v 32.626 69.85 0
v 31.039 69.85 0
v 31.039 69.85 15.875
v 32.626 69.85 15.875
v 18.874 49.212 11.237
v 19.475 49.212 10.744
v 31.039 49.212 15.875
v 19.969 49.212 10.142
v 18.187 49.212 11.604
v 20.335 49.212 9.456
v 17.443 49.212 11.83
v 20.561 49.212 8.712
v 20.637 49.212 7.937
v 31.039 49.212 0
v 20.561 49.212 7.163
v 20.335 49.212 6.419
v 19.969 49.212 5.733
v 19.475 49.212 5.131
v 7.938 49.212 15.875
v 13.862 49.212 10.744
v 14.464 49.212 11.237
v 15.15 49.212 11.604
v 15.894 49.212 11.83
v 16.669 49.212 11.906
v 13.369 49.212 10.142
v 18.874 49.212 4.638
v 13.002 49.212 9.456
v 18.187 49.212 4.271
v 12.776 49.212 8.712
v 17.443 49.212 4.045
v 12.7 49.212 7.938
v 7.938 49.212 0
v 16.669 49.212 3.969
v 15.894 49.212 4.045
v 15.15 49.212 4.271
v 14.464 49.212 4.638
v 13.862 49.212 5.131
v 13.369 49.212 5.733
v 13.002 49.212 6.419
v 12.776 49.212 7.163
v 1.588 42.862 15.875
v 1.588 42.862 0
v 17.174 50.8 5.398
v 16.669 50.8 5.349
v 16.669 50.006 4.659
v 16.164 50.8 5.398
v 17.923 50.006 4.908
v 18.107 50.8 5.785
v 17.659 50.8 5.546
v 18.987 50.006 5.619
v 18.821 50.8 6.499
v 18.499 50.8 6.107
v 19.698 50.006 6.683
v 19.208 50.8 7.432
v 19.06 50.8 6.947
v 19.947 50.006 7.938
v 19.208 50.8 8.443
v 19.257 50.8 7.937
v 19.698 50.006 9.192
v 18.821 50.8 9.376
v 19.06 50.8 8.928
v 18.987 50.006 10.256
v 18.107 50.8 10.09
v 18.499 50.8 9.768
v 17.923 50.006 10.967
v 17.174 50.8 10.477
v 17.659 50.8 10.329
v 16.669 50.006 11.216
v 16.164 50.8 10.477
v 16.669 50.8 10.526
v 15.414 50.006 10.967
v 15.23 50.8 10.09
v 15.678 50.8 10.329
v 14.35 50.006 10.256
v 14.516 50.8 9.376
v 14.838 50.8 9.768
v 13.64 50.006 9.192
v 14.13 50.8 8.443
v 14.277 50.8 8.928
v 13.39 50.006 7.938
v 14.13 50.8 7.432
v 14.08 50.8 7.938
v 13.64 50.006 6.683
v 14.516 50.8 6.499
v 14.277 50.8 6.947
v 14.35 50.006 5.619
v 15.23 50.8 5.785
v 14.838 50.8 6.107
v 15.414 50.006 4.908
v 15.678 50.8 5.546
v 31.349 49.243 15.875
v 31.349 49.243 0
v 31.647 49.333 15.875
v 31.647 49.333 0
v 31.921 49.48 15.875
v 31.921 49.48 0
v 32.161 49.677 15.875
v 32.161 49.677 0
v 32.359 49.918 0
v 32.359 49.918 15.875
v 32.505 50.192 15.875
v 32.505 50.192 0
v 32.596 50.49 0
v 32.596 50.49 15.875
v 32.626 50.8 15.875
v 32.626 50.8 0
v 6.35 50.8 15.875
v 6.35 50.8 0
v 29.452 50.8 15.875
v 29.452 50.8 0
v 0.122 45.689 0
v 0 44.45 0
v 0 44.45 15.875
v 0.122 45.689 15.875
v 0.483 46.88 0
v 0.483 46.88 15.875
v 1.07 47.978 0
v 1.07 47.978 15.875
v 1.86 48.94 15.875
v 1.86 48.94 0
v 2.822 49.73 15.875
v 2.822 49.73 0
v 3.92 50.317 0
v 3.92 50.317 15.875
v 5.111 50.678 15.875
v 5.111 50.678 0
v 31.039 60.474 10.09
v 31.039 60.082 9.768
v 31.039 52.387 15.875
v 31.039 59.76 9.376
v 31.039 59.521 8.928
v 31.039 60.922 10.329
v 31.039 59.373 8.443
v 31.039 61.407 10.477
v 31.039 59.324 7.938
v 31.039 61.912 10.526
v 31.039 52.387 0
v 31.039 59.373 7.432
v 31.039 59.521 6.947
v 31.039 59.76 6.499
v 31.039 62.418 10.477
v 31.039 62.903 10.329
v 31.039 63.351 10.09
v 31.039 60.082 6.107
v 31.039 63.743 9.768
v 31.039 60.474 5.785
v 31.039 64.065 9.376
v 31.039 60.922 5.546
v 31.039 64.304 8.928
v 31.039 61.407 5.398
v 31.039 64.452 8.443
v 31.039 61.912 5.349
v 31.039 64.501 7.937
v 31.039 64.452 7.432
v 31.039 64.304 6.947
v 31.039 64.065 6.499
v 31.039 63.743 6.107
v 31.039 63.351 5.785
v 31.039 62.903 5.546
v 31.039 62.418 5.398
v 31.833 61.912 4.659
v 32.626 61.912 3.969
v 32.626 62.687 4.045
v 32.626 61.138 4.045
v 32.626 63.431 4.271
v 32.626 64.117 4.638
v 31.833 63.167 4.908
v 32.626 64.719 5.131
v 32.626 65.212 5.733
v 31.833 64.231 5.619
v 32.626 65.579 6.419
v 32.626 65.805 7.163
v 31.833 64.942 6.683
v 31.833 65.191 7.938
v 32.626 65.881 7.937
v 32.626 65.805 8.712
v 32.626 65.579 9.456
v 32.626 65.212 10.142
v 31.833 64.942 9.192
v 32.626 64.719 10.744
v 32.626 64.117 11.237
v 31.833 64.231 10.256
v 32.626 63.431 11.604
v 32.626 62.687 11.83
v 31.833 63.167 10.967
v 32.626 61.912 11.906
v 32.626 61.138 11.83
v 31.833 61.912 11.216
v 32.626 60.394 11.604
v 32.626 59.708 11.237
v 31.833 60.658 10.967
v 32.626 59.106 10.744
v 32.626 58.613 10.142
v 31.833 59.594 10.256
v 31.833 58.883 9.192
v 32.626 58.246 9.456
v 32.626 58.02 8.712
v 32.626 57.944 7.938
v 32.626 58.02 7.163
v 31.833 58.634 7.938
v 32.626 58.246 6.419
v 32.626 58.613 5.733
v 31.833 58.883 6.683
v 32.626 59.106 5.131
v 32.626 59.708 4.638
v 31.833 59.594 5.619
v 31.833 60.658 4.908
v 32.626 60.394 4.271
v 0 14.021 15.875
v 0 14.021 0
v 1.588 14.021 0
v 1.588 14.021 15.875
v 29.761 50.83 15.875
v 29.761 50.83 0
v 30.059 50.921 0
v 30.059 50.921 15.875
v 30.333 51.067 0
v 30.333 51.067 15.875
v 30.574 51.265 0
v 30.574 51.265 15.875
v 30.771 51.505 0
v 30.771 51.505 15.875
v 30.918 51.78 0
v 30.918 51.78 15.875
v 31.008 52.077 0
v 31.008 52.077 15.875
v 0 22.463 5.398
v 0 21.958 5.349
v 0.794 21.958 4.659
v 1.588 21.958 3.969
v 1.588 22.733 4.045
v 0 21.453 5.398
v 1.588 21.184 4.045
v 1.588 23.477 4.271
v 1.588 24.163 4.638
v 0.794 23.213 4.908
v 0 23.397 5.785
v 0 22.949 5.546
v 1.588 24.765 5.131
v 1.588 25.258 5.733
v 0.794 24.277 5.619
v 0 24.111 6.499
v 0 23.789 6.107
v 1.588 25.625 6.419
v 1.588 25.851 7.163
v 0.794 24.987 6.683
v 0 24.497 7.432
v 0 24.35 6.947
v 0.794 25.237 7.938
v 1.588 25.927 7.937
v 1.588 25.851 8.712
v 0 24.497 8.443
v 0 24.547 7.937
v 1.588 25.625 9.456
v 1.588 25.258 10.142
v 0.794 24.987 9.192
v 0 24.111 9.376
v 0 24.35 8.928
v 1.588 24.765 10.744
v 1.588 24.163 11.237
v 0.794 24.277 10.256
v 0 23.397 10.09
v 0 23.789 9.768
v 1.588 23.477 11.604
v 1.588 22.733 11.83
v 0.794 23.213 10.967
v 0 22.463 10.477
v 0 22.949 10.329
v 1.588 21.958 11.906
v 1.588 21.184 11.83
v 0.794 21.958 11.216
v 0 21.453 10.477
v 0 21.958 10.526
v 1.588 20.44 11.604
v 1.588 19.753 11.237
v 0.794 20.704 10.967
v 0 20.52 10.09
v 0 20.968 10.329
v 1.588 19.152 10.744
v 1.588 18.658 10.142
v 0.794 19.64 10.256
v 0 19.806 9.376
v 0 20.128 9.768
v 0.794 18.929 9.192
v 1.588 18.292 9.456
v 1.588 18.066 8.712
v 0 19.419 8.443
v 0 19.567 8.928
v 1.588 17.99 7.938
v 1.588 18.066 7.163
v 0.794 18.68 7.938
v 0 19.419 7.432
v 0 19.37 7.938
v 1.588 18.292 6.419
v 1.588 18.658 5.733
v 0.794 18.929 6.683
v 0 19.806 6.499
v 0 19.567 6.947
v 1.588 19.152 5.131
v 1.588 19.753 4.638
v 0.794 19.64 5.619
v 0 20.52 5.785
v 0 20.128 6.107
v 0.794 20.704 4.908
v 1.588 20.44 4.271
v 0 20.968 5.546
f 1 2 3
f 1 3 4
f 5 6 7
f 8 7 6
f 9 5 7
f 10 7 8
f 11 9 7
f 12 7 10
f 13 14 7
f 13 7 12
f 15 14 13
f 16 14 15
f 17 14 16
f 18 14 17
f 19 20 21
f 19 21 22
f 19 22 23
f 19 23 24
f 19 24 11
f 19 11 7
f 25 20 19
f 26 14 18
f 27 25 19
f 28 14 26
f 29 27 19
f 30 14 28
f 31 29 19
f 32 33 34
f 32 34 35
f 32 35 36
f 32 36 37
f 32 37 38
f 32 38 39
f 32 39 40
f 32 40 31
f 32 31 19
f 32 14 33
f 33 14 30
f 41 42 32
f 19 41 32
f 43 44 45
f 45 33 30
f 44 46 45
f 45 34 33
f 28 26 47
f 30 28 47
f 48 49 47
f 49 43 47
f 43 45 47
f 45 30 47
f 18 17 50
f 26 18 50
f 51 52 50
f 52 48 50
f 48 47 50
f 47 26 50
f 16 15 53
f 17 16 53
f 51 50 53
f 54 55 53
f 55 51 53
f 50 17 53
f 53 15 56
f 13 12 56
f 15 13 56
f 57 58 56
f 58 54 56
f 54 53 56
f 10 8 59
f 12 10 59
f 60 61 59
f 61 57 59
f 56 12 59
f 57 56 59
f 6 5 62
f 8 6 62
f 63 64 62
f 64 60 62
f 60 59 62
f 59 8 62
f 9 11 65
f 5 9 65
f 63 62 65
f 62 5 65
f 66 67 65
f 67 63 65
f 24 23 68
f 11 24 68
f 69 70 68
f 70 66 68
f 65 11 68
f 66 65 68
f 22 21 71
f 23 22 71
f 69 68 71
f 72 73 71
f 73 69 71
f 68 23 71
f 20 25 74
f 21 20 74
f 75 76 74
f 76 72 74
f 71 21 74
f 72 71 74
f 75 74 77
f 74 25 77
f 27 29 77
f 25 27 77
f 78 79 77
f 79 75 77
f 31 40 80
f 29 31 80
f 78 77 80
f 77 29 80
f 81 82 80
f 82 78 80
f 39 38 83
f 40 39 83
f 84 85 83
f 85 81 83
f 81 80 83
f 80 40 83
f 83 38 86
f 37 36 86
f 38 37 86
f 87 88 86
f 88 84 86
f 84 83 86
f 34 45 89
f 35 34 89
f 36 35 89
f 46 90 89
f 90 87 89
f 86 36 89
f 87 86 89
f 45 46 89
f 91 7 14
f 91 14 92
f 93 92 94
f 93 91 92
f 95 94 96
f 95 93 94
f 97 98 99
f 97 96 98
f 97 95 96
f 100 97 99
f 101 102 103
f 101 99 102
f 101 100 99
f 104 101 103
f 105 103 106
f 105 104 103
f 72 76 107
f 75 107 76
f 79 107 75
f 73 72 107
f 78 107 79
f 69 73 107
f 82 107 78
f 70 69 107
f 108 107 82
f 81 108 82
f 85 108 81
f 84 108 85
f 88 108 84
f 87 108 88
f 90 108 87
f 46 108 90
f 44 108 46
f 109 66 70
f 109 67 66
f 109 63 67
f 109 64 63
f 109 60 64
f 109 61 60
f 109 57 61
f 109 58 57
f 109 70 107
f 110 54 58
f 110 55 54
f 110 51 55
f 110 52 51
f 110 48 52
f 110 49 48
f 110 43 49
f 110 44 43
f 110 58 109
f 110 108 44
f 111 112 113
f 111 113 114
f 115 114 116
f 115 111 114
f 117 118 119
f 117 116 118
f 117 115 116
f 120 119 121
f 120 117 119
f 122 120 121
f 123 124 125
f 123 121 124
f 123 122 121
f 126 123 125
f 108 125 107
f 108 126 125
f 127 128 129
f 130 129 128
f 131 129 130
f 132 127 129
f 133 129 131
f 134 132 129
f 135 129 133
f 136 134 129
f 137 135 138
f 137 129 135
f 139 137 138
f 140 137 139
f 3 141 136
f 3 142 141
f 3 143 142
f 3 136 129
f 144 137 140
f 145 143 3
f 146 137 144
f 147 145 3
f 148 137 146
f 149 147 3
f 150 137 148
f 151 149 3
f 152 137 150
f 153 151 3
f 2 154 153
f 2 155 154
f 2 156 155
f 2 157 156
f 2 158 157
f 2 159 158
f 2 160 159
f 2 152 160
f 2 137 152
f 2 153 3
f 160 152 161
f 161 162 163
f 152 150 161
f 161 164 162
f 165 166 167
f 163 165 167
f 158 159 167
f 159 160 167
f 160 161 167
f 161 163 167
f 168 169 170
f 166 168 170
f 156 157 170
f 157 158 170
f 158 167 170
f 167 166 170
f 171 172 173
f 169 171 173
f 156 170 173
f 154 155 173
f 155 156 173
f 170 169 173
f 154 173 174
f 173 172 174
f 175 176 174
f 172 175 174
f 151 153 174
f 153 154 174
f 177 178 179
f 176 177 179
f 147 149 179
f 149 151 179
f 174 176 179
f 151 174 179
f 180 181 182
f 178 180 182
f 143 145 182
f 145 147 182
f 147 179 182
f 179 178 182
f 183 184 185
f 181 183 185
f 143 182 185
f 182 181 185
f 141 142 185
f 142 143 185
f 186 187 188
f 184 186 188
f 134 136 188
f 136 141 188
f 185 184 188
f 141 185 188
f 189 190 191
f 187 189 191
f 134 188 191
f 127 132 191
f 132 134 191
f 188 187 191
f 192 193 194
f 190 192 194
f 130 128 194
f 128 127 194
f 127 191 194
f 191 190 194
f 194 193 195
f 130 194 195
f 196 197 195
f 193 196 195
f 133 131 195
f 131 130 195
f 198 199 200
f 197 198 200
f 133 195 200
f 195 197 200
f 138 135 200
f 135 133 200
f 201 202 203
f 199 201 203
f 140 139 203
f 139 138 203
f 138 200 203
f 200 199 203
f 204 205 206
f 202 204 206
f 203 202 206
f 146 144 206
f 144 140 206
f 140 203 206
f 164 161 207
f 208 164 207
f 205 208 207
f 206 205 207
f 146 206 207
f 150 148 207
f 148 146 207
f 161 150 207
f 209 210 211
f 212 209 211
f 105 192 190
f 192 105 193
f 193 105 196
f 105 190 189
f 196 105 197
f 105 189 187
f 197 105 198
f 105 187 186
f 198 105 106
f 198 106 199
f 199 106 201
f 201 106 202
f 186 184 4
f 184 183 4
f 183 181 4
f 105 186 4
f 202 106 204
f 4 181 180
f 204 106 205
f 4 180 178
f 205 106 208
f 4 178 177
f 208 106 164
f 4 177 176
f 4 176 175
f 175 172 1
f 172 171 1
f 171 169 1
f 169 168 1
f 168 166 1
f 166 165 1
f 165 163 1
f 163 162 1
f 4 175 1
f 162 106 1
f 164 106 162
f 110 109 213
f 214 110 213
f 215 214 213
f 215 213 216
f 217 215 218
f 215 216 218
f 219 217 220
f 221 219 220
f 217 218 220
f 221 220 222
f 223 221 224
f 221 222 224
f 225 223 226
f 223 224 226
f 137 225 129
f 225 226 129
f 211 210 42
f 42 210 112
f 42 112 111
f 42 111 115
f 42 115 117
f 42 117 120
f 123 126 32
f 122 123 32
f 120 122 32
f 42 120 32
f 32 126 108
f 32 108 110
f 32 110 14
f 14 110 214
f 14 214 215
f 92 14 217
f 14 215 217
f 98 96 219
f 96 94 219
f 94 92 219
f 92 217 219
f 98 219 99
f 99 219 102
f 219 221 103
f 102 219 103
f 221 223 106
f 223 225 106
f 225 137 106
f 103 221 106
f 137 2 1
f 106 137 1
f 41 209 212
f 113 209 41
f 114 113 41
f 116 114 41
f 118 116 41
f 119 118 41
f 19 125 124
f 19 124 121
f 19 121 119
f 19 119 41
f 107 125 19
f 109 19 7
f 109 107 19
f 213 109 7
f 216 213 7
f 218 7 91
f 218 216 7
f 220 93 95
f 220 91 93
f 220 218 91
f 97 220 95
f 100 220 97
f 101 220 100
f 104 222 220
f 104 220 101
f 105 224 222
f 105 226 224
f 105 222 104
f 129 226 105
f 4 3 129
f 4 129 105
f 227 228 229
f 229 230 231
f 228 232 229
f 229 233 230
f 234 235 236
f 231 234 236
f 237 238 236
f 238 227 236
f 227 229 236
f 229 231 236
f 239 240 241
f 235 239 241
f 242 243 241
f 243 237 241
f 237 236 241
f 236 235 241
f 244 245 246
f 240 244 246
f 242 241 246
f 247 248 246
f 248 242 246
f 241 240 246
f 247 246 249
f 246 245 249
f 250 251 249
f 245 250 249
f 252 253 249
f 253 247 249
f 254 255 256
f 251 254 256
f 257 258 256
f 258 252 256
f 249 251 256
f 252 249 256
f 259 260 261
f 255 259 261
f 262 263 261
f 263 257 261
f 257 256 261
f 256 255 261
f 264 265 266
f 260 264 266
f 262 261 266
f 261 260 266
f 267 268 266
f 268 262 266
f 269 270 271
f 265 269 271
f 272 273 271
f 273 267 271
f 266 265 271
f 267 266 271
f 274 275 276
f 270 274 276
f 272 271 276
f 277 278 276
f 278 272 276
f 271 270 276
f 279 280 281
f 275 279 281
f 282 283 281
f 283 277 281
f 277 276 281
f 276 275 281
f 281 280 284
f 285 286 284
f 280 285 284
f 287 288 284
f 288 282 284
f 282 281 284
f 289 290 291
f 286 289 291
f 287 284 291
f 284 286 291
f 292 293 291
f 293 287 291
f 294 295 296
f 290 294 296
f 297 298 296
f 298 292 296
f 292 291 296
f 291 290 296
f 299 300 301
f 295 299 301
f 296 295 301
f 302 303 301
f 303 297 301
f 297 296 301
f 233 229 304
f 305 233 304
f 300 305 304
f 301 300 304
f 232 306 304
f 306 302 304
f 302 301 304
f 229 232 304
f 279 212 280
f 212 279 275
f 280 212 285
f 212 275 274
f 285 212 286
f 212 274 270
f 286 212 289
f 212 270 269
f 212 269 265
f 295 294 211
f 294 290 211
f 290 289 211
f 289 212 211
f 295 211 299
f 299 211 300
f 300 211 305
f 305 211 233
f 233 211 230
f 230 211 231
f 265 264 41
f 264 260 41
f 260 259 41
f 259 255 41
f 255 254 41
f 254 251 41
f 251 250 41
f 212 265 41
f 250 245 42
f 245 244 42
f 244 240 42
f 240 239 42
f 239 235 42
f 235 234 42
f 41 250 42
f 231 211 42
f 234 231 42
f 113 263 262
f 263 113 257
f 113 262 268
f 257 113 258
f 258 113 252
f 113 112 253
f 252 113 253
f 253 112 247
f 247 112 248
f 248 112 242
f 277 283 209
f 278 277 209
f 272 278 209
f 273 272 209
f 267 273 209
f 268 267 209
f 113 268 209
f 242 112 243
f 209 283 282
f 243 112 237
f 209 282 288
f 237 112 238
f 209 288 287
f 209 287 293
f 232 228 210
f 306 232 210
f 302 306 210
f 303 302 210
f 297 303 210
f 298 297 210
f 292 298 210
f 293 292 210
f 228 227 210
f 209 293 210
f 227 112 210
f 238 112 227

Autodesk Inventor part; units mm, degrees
ref_plane "YZ Plane" through (0, 0, 0) normal (1, 0, 0) x (0, 1, 0)
ref_plane "XZ Plane" through (0, 0, 0) normal (0, 1, 0) x (-1, 0, 0)
ref_plane "XY Plane" through (0, 0, 0) normal (0, 0, 1) x (1, 0, 0)
sketch "Sketch1" plane through (0, 0, 0) normal (0, 0, 1) x (1, 0, 0)
  line L0 (1.5875, 14.0208) -> (1.5875, 42.8625)
  line L1 (0, 44.45) -> (0, 14.0208)
  line L2 (6.35, 50.8) -> (31.0388, 50.8)
  line L3 (32.6263, 49.2125) -> (7.9375, 49.2125)
  arc A0 (6.35, 50.8) -> (0, 44.45) centre (6.35, 44.45) ccw
  line L4 (1.5875, 42.8625) -> (7.9375, 49.2125)
  line L5 (31.0388, 50.8) -> (31.0388, 69.85)
  line L6 (32.6263, 50.8) -> (32.6263, 69.85)
  line L7 (31.0388, 69.85) -> (32.6263, 69.85)
  line L8 (32.6263, 50.8) -> (32.6263, 49.2125)
  line L9 (0, 14.0208) -> (1.5875, 14.0208)
  point P0 (0, 0)
  point P1 (1.8599, 48.9401)
  point P2 (4.7625, 46.0375)
  dimension "d7" = 1.5875
  dimension "d8" = 19.05
  dimension "d48" = 24.6888
extrude "Extrusion1" add sketch "Sketch1" along normal blind 15.875
fillet "Fillet1" radius 1.5875 2 edges at (31.0388, 50.8, 7.9375) (32.6263, 49.2125, 7.9375)
sketch "Sketch2" plane through (32.6263, 69.85, 15.875) normal (1, 0, 0) x (0, 0, -1)
  line L0 (15.875, 0) -> (0, 0) projected
  point P0 (15.875, -69.85)
  point P1 (7.9375, -7.9375)
  dimension "d12" = 7.9375
sketch "Sketch5" plane through (7.9375, 49.2125, 0) normal (0, -1, 0) x (1, 0, 0)
  point P0 (-7.9375, 0)
  point P1 (8.7312, 7.9375)
sketch "Sketch6" plane through (1.5875, 14.0208, 0) normal (1, 0, 0) x (0, 0, -1)
  line L0 (0, 0) -> (-15.875, 0) projected
  line L1 (0, 0) -> (0, 28.8417) projected
  line L2 (0, 28.8417) -> (-15.875, 28.8417) projected
  line L3 (-15.875, 0) -> (-15.875, 28.8417) projected
  line L4 (0, 0) -> (-15.875, 0) projected
  point P0 (-7.9375, 7.9375)
  point P1 (-7.9375, 30.1625)
  dimension "d15" = 7.9375
hole "Hole2" at (16.6687, 49.2125, 7.9375) direction (0, 1, 0) diameter 4.7625 end through all countersink diameter 7.9375 countersink angle 82
hole "Hole3" at (32.6263, 61.9125, 7.9375) direction (-1, 0, 0) diameter 4.7625 end through all countersink diameter 7.9375 countersink angle 82
hole "Hole4" at (1.5875, 21.9583, 7.9375) direction (-1, 0, 0) diameter 4.7625 end through all countersink diameter 7.9375 countersink angle 82
properties part number "bracket"
